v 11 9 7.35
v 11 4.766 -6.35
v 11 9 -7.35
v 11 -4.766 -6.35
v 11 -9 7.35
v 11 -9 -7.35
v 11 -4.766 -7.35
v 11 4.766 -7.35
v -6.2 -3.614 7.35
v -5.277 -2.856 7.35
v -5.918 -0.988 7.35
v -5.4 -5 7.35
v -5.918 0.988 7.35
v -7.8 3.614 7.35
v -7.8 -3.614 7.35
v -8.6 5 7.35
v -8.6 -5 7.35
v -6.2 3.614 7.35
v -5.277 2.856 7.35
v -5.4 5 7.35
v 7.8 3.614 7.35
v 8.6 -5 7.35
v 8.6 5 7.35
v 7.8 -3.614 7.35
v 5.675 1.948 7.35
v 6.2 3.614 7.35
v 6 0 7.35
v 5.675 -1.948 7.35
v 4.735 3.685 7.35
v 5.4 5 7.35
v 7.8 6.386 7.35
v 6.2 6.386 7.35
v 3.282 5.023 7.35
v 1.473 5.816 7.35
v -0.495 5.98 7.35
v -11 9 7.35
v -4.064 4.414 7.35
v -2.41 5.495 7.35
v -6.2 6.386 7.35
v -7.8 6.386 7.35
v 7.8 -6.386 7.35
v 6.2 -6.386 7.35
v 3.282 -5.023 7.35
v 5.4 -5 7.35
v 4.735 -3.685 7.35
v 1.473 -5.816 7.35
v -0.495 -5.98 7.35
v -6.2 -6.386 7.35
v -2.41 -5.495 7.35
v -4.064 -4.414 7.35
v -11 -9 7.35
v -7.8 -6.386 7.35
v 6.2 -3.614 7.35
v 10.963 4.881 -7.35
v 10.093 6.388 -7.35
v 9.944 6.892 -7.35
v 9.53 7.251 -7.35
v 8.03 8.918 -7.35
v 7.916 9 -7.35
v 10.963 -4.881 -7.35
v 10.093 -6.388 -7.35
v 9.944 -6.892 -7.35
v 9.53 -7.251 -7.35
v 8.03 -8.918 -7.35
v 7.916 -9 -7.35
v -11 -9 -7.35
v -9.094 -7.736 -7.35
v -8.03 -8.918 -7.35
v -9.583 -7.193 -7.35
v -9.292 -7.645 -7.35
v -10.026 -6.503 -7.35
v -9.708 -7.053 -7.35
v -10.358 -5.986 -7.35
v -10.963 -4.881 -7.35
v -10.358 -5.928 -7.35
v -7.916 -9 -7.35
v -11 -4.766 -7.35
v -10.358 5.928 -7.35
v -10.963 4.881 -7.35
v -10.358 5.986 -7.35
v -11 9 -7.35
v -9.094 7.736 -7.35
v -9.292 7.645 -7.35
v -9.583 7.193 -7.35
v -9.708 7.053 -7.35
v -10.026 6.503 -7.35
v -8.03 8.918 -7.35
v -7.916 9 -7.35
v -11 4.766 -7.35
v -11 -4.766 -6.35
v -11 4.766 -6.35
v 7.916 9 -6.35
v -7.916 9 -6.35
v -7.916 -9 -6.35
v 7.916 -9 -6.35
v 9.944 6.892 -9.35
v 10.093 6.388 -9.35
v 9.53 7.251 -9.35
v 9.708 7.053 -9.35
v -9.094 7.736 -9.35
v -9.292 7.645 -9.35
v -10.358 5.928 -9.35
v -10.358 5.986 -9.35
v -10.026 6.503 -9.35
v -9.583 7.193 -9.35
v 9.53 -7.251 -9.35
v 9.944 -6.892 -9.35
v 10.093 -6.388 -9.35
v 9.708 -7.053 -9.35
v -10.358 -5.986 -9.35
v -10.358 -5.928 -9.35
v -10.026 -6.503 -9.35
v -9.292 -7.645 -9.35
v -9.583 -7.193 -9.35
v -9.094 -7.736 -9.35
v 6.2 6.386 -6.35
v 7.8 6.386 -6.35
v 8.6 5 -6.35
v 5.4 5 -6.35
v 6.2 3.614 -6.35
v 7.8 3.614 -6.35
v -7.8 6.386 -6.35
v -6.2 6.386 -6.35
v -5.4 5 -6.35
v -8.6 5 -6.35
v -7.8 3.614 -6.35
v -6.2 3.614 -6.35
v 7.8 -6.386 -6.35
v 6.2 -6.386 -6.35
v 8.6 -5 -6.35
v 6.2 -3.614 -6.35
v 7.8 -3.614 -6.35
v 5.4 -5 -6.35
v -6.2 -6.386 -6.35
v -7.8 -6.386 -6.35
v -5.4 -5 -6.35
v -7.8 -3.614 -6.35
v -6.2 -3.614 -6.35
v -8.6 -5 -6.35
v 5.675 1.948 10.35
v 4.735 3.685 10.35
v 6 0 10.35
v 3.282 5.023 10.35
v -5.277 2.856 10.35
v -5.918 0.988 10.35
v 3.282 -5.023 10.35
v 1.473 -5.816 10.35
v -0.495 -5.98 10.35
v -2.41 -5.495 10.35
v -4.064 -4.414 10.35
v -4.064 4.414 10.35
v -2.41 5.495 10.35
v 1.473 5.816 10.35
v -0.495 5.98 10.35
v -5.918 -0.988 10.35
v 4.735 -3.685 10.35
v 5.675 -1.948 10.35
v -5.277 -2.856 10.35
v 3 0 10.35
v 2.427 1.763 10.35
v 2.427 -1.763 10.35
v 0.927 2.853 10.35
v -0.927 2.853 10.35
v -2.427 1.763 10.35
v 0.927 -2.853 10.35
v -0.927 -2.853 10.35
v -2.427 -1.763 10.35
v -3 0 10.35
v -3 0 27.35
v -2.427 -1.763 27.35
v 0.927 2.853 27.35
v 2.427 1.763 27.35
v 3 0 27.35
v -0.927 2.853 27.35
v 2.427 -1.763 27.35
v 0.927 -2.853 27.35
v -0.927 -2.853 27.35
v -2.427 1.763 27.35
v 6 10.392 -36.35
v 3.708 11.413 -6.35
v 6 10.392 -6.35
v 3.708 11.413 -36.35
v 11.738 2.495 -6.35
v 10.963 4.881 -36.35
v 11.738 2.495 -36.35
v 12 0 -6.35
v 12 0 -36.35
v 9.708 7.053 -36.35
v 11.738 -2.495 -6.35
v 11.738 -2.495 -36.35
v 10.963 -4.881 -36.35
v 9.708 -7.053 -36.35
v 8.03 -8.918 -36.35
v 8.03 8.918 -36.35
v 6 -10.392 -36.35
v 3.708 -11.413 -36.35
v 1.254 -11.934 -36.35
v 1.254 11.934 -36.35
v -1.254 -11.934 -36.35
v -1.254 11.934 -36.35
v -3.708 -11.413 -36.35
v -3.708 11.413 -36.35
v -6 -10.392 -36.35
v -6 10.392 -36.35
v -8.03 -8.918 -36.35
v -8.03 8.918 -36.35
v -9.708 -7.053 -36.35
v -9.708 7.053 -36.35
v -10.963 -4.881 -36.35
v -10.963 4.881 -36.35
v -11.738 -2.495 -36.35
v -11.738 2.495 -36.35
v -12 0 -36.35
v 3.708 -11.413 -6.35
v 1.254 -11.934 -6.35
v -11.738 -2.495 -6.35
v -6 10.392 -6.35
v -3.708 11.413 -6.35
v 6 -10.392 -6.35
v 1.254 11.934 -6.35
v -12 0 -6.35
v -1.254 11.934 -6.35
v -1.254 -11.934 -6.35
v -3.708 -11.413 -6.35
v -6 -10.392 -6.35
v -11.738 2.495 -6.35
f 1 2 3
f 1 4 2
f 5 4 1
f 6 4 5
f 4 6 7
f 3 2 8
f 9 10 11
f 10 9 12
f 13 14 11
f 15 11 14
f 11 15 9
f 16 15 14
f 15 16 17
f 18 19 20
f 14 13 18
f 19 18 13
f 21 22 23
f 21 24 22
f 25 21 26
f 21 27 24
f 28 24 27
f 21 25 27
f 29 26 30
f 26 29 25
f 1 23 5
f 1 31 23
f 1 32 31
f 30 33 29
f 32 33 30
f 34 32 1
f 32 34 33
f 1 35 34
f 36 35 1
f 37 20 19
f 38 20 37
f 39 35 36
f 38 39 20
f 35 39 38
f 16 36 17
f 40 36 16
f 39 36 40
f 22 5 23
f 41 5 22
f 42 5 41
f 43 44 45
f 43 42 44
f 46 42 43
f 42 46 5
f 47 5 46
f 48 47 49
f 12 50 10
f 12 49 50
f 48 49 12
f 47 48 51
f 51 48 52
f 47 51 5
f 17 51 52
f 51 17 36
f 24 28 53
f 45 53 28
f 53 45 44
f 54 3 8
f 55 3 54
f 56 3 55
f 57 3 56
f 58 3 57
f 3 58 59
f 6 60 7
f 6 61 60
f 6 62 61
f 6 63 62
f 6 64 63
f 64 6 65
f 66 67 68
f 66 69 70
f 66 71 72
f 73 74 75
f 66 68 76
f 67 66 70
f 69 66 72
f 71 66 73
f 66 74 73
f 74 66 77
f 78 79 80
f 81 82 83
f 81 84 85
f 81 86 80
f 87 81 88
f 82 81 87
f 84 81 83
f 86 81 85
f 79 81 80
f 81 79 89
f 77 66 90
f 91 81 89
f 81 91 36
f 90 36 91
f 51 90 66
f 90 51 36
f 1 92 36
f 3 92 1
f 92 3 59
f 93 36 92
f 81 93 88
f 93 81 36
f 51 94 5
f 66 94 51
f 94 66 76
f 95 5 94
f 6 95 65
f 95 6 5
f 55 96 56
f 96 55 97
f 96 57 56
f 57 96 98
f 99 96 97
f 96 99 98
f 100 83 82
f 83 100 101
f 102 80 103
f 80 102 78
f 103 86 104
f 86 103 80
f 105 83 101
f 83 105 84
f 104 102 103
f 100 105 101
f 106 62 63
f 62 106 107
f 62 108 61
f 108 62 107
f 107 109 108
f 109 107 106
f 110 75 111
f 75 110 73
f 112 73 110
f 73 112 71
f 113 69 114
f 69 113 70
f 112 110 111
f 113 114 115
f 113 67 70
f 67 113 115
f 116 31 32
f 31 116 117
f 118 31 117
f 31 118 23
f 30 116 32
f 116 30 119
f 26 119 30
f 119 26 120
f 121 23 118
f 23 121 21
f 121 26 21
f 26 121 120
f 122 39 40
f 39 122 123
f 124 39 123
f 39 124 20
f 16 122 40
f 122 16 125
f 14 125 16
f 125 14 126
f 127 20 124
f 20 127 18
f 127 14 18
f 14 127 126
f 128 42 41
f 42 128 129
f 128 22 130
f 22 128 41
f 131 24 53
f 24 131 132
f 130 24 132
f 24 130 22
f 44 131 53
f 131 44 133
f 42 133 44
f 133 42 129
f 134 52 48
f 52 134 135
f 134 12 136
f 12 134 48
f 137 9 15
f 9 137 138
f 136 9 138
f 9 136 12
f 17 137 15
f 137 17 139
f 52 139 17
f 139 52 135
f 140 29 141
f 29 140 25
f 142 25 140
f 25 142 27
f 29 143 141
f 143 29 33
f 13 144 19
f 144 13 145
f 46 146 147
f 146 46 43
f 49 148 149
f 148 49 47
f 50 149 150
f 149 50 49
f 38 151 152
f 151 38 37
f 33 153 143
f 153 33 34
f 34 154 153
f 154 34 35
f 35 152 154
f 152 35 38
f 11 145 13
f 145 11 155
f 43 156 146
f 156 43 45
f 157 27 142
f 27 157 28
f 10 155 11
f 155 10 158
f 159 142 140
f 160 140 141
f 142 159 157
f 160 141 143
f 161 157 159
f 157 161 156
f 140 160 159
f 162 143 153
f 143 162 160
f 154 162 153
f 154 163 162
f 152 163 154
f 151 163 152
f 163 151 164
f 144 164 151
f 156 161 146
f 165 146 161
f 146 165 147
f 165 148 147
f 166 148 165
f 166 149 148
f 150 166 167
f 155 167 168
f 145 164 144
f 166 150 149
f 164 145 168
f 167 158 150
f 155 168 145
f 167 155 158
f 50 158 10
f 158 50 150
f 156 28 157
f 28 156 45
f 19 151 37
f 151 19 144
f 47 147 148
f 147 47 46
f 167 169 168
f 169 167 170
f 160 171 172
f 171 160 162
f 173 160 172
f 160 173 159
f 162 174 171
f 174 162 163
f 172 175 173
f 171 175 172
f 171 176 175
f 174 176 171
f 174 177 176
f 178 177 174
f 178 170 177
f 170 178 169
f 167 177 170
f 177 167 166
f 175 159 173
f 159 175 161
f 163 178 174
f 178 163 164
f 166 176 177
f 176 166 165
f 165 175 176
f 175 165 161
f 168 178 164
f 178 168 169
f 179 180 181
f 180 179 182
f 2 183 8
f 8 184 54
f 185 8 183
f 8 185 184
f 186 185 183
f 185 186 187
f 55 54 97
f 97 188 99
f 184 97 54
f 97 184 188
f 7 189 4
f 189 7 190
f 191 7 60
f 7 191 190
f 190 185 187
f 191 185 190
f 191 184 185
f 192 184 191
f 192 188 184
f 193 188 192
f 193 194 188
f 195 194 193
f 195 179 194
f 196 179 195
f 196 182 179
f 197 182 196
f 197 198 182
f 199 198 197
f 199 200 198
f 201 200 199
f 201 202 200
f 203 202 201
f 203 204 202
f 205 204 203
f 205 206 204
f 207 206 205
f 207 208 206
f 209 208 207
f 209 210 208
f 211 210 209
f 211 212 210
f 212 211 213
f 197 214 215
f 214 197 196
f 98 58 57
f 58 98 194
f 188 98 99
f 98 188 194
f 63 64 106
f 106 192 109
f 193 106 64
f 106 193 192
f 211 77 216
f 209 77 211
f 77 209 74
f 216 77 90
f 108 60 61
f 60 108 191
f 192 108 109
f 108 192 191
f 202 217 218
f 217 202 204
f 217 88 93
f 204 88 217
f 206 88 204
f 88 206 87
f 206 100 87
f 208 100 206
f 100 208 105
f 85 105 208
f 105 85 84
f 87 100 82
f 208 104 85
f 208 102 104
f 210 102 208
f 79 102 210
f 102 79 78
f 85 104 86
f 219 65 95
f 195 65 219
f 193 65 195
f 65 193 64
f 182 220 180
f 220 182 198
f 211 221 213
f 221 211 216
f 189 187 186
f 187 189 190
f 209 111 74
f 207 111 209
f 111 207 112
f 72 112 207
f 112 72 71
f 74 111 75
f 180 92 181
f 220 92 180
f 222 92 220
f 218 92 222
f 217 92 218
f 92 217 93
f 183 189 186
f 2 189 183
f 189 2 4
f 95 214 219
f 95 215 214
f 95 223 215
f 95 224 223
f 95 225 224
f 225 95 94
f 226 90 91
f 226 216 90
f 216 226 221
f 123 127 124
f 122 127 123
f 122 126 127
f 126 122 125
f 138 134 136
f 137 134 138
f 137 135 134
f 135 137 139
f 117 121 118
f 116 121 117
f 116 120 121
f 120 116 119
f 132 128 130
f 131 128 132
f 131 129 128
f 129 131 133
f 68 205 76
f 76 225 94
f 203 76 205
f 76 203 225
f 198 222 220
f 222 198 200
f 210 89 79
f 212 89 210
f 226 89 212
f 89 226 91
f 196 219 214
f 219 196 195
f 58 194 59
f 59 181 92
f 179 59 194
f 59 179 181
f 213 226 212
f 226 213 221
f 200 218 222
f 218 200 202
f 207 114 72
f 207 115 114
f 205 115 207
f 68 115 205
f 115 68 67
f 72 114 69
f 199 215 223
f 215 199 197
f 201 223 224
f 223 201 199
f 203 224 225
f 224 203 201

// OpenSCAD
// Parameters
type_v0 = 6; //[3:12:0.1]
type_v1 = 5.5; //[2.75:11:0.1]
type_v2 = 14.7; //[7.35:29.4:0.1]
type_v3 = 12; //[6:24:0.1]
alpha = 1; //[0.1:1:0.05]
overlap = 1; //[0.5:2:0.1]
shaft_d = 6; //[3:12:0.1]
shaft_len = 18; //[9:36:0.5]
shaft_boss_d = 12; //[6:24:0.1]
shaft_boss_h = 4; //[2:8:0.1]
gearbox_w = 22; //[11:44:0.5]
gearbox_d = 18; //[9:36:0.5]
gearbox_h = 14.7; //[7.35:29.4:0.1]
motor_d = 24; //[12:48:0.5]
motor_len = 30; //[15:60:0.5]
hub_d = 10; //[5:20:0.1]
hub_h = 2.5; //[1:6:0.1]
screw_hole_d = 3.2; //[2:6:0.1]
screw_boss_d = 7; //[4:14:0.1]
screw_boss_h = 2; //[1:6:0.1]
screw_offset_x = 7; //[3:14:0.1]
screw_offset_y = 5; //[2:10:0.1]
tag_w = 6; //[3:12:0.1]
tag_h = 10; //[5:20:0.5]
tag_t = 1.2; //[0.6:2.4:0.1]
tag_spacing = 10; //[5:20:0.5]

// Gear Motor - complete geometry
module gear_motor() {
  color("DimGray") {
    // Gearbox housing with bosses
    difference() {
      union() {
        translate([0, 0, 0])
          cube([gearbox_w, gearbox_d, gearbox_h], center=true);
        translate([screw_offset_x, screw_offset_y, -screw_boss_h/2])
          cylinder(r=screw_boss_d/2, h=gearbox_h + screw_boss_h, center=true);
        translate([-screw_offset_x, screw_offset_y, -screw_boss_h/2])
          cylinder(r=screw_boss_d/2, h=gearbox_h + screw_boss_h, center=true);
        translate([screw_offset_x, -screw_offset_y, -screw_boss_h/2])
          cylinder(r=screw_boss_d/2, h=gearbox_h + screw_boss_h, center=true);
        translate([-screw_offset_x, -screw_offset_y, -screw_boss_h/2])
          cylinder(r=screw_boss_d/2, h=gearbox_h + screw_boss_h, center=true);
      }
      // Mounting screw holes
      translate([screw_offset_x, screw_offset_y, -screw_boss_h/2])
        cylinder(r=screw_hole_d/2, h=gearbox_h + screw_boss_h + overlap*2, center=true);
      translate([-screw_offset_x, screw_offset_y, -screw_boss_h/2])
        cylinder(r=screw_hole_d/2, h=gearbox_h + screw_boss_h + overlap*2, center=true);
      translate([screw_offset_x, -screw_offset_y, -screw_boss_h/2])
        cylinder(r=screw_hole_d/2, h=gearbox_h + screw_boss_h + overlap*2, center=true);
      translate([-screw_offset_x, -screw_offset_y, -screw_boss_h/2])
        cylinder(r=screw_hole_d/2, h=gearbox_h + screw_boss_h + overlap*2, center=true);
    }
    
    // Shaft boss
    translate([0, 0, gearbox_h/2 + shaft_boss_h/2 - overlap])
      cylinder(r=shaft_boss_d/2, h=shaft_boss_h, center=true);
    
    // Shaft
    color("Silver") translate([0, 0, gearbox_h/2 + shaft_boss_h - overlap + shaft_len/2 - overlap])
      cylinder(r=shaft_d/2, h=shaft_len, center=true);
    
    // Motor can
    color("Black") translate([0, 0, -gearbox_h/2 - motor_len/2 + overlap])
      cylinder(r=motor_d/2, h=motor_len, center=true);
    
    // Motor hub
    translate([0, 0, -gearbox_h/2 - motor_len + hub_h/2 + overlap])
      cylinder(r=hub_d/2, h=hub_h, center=true);
    
    // Electrical tags
    translate([-tag_spacing/2, 0, -gearbox_h/2 - motor_len + tag_h/2 + overlap])
      cube([tag_w, tag_t, tag_h], center=true);
    translate([tag_spacing/2, 0, -gearbox_h/2 - motor_len + tag_h/2 + overlap])
      cube([tag_w, tag_t, tag_h], center=true);
  }
}

// Assembly
module assembly() {
  gear_motor();
}

assembly();
